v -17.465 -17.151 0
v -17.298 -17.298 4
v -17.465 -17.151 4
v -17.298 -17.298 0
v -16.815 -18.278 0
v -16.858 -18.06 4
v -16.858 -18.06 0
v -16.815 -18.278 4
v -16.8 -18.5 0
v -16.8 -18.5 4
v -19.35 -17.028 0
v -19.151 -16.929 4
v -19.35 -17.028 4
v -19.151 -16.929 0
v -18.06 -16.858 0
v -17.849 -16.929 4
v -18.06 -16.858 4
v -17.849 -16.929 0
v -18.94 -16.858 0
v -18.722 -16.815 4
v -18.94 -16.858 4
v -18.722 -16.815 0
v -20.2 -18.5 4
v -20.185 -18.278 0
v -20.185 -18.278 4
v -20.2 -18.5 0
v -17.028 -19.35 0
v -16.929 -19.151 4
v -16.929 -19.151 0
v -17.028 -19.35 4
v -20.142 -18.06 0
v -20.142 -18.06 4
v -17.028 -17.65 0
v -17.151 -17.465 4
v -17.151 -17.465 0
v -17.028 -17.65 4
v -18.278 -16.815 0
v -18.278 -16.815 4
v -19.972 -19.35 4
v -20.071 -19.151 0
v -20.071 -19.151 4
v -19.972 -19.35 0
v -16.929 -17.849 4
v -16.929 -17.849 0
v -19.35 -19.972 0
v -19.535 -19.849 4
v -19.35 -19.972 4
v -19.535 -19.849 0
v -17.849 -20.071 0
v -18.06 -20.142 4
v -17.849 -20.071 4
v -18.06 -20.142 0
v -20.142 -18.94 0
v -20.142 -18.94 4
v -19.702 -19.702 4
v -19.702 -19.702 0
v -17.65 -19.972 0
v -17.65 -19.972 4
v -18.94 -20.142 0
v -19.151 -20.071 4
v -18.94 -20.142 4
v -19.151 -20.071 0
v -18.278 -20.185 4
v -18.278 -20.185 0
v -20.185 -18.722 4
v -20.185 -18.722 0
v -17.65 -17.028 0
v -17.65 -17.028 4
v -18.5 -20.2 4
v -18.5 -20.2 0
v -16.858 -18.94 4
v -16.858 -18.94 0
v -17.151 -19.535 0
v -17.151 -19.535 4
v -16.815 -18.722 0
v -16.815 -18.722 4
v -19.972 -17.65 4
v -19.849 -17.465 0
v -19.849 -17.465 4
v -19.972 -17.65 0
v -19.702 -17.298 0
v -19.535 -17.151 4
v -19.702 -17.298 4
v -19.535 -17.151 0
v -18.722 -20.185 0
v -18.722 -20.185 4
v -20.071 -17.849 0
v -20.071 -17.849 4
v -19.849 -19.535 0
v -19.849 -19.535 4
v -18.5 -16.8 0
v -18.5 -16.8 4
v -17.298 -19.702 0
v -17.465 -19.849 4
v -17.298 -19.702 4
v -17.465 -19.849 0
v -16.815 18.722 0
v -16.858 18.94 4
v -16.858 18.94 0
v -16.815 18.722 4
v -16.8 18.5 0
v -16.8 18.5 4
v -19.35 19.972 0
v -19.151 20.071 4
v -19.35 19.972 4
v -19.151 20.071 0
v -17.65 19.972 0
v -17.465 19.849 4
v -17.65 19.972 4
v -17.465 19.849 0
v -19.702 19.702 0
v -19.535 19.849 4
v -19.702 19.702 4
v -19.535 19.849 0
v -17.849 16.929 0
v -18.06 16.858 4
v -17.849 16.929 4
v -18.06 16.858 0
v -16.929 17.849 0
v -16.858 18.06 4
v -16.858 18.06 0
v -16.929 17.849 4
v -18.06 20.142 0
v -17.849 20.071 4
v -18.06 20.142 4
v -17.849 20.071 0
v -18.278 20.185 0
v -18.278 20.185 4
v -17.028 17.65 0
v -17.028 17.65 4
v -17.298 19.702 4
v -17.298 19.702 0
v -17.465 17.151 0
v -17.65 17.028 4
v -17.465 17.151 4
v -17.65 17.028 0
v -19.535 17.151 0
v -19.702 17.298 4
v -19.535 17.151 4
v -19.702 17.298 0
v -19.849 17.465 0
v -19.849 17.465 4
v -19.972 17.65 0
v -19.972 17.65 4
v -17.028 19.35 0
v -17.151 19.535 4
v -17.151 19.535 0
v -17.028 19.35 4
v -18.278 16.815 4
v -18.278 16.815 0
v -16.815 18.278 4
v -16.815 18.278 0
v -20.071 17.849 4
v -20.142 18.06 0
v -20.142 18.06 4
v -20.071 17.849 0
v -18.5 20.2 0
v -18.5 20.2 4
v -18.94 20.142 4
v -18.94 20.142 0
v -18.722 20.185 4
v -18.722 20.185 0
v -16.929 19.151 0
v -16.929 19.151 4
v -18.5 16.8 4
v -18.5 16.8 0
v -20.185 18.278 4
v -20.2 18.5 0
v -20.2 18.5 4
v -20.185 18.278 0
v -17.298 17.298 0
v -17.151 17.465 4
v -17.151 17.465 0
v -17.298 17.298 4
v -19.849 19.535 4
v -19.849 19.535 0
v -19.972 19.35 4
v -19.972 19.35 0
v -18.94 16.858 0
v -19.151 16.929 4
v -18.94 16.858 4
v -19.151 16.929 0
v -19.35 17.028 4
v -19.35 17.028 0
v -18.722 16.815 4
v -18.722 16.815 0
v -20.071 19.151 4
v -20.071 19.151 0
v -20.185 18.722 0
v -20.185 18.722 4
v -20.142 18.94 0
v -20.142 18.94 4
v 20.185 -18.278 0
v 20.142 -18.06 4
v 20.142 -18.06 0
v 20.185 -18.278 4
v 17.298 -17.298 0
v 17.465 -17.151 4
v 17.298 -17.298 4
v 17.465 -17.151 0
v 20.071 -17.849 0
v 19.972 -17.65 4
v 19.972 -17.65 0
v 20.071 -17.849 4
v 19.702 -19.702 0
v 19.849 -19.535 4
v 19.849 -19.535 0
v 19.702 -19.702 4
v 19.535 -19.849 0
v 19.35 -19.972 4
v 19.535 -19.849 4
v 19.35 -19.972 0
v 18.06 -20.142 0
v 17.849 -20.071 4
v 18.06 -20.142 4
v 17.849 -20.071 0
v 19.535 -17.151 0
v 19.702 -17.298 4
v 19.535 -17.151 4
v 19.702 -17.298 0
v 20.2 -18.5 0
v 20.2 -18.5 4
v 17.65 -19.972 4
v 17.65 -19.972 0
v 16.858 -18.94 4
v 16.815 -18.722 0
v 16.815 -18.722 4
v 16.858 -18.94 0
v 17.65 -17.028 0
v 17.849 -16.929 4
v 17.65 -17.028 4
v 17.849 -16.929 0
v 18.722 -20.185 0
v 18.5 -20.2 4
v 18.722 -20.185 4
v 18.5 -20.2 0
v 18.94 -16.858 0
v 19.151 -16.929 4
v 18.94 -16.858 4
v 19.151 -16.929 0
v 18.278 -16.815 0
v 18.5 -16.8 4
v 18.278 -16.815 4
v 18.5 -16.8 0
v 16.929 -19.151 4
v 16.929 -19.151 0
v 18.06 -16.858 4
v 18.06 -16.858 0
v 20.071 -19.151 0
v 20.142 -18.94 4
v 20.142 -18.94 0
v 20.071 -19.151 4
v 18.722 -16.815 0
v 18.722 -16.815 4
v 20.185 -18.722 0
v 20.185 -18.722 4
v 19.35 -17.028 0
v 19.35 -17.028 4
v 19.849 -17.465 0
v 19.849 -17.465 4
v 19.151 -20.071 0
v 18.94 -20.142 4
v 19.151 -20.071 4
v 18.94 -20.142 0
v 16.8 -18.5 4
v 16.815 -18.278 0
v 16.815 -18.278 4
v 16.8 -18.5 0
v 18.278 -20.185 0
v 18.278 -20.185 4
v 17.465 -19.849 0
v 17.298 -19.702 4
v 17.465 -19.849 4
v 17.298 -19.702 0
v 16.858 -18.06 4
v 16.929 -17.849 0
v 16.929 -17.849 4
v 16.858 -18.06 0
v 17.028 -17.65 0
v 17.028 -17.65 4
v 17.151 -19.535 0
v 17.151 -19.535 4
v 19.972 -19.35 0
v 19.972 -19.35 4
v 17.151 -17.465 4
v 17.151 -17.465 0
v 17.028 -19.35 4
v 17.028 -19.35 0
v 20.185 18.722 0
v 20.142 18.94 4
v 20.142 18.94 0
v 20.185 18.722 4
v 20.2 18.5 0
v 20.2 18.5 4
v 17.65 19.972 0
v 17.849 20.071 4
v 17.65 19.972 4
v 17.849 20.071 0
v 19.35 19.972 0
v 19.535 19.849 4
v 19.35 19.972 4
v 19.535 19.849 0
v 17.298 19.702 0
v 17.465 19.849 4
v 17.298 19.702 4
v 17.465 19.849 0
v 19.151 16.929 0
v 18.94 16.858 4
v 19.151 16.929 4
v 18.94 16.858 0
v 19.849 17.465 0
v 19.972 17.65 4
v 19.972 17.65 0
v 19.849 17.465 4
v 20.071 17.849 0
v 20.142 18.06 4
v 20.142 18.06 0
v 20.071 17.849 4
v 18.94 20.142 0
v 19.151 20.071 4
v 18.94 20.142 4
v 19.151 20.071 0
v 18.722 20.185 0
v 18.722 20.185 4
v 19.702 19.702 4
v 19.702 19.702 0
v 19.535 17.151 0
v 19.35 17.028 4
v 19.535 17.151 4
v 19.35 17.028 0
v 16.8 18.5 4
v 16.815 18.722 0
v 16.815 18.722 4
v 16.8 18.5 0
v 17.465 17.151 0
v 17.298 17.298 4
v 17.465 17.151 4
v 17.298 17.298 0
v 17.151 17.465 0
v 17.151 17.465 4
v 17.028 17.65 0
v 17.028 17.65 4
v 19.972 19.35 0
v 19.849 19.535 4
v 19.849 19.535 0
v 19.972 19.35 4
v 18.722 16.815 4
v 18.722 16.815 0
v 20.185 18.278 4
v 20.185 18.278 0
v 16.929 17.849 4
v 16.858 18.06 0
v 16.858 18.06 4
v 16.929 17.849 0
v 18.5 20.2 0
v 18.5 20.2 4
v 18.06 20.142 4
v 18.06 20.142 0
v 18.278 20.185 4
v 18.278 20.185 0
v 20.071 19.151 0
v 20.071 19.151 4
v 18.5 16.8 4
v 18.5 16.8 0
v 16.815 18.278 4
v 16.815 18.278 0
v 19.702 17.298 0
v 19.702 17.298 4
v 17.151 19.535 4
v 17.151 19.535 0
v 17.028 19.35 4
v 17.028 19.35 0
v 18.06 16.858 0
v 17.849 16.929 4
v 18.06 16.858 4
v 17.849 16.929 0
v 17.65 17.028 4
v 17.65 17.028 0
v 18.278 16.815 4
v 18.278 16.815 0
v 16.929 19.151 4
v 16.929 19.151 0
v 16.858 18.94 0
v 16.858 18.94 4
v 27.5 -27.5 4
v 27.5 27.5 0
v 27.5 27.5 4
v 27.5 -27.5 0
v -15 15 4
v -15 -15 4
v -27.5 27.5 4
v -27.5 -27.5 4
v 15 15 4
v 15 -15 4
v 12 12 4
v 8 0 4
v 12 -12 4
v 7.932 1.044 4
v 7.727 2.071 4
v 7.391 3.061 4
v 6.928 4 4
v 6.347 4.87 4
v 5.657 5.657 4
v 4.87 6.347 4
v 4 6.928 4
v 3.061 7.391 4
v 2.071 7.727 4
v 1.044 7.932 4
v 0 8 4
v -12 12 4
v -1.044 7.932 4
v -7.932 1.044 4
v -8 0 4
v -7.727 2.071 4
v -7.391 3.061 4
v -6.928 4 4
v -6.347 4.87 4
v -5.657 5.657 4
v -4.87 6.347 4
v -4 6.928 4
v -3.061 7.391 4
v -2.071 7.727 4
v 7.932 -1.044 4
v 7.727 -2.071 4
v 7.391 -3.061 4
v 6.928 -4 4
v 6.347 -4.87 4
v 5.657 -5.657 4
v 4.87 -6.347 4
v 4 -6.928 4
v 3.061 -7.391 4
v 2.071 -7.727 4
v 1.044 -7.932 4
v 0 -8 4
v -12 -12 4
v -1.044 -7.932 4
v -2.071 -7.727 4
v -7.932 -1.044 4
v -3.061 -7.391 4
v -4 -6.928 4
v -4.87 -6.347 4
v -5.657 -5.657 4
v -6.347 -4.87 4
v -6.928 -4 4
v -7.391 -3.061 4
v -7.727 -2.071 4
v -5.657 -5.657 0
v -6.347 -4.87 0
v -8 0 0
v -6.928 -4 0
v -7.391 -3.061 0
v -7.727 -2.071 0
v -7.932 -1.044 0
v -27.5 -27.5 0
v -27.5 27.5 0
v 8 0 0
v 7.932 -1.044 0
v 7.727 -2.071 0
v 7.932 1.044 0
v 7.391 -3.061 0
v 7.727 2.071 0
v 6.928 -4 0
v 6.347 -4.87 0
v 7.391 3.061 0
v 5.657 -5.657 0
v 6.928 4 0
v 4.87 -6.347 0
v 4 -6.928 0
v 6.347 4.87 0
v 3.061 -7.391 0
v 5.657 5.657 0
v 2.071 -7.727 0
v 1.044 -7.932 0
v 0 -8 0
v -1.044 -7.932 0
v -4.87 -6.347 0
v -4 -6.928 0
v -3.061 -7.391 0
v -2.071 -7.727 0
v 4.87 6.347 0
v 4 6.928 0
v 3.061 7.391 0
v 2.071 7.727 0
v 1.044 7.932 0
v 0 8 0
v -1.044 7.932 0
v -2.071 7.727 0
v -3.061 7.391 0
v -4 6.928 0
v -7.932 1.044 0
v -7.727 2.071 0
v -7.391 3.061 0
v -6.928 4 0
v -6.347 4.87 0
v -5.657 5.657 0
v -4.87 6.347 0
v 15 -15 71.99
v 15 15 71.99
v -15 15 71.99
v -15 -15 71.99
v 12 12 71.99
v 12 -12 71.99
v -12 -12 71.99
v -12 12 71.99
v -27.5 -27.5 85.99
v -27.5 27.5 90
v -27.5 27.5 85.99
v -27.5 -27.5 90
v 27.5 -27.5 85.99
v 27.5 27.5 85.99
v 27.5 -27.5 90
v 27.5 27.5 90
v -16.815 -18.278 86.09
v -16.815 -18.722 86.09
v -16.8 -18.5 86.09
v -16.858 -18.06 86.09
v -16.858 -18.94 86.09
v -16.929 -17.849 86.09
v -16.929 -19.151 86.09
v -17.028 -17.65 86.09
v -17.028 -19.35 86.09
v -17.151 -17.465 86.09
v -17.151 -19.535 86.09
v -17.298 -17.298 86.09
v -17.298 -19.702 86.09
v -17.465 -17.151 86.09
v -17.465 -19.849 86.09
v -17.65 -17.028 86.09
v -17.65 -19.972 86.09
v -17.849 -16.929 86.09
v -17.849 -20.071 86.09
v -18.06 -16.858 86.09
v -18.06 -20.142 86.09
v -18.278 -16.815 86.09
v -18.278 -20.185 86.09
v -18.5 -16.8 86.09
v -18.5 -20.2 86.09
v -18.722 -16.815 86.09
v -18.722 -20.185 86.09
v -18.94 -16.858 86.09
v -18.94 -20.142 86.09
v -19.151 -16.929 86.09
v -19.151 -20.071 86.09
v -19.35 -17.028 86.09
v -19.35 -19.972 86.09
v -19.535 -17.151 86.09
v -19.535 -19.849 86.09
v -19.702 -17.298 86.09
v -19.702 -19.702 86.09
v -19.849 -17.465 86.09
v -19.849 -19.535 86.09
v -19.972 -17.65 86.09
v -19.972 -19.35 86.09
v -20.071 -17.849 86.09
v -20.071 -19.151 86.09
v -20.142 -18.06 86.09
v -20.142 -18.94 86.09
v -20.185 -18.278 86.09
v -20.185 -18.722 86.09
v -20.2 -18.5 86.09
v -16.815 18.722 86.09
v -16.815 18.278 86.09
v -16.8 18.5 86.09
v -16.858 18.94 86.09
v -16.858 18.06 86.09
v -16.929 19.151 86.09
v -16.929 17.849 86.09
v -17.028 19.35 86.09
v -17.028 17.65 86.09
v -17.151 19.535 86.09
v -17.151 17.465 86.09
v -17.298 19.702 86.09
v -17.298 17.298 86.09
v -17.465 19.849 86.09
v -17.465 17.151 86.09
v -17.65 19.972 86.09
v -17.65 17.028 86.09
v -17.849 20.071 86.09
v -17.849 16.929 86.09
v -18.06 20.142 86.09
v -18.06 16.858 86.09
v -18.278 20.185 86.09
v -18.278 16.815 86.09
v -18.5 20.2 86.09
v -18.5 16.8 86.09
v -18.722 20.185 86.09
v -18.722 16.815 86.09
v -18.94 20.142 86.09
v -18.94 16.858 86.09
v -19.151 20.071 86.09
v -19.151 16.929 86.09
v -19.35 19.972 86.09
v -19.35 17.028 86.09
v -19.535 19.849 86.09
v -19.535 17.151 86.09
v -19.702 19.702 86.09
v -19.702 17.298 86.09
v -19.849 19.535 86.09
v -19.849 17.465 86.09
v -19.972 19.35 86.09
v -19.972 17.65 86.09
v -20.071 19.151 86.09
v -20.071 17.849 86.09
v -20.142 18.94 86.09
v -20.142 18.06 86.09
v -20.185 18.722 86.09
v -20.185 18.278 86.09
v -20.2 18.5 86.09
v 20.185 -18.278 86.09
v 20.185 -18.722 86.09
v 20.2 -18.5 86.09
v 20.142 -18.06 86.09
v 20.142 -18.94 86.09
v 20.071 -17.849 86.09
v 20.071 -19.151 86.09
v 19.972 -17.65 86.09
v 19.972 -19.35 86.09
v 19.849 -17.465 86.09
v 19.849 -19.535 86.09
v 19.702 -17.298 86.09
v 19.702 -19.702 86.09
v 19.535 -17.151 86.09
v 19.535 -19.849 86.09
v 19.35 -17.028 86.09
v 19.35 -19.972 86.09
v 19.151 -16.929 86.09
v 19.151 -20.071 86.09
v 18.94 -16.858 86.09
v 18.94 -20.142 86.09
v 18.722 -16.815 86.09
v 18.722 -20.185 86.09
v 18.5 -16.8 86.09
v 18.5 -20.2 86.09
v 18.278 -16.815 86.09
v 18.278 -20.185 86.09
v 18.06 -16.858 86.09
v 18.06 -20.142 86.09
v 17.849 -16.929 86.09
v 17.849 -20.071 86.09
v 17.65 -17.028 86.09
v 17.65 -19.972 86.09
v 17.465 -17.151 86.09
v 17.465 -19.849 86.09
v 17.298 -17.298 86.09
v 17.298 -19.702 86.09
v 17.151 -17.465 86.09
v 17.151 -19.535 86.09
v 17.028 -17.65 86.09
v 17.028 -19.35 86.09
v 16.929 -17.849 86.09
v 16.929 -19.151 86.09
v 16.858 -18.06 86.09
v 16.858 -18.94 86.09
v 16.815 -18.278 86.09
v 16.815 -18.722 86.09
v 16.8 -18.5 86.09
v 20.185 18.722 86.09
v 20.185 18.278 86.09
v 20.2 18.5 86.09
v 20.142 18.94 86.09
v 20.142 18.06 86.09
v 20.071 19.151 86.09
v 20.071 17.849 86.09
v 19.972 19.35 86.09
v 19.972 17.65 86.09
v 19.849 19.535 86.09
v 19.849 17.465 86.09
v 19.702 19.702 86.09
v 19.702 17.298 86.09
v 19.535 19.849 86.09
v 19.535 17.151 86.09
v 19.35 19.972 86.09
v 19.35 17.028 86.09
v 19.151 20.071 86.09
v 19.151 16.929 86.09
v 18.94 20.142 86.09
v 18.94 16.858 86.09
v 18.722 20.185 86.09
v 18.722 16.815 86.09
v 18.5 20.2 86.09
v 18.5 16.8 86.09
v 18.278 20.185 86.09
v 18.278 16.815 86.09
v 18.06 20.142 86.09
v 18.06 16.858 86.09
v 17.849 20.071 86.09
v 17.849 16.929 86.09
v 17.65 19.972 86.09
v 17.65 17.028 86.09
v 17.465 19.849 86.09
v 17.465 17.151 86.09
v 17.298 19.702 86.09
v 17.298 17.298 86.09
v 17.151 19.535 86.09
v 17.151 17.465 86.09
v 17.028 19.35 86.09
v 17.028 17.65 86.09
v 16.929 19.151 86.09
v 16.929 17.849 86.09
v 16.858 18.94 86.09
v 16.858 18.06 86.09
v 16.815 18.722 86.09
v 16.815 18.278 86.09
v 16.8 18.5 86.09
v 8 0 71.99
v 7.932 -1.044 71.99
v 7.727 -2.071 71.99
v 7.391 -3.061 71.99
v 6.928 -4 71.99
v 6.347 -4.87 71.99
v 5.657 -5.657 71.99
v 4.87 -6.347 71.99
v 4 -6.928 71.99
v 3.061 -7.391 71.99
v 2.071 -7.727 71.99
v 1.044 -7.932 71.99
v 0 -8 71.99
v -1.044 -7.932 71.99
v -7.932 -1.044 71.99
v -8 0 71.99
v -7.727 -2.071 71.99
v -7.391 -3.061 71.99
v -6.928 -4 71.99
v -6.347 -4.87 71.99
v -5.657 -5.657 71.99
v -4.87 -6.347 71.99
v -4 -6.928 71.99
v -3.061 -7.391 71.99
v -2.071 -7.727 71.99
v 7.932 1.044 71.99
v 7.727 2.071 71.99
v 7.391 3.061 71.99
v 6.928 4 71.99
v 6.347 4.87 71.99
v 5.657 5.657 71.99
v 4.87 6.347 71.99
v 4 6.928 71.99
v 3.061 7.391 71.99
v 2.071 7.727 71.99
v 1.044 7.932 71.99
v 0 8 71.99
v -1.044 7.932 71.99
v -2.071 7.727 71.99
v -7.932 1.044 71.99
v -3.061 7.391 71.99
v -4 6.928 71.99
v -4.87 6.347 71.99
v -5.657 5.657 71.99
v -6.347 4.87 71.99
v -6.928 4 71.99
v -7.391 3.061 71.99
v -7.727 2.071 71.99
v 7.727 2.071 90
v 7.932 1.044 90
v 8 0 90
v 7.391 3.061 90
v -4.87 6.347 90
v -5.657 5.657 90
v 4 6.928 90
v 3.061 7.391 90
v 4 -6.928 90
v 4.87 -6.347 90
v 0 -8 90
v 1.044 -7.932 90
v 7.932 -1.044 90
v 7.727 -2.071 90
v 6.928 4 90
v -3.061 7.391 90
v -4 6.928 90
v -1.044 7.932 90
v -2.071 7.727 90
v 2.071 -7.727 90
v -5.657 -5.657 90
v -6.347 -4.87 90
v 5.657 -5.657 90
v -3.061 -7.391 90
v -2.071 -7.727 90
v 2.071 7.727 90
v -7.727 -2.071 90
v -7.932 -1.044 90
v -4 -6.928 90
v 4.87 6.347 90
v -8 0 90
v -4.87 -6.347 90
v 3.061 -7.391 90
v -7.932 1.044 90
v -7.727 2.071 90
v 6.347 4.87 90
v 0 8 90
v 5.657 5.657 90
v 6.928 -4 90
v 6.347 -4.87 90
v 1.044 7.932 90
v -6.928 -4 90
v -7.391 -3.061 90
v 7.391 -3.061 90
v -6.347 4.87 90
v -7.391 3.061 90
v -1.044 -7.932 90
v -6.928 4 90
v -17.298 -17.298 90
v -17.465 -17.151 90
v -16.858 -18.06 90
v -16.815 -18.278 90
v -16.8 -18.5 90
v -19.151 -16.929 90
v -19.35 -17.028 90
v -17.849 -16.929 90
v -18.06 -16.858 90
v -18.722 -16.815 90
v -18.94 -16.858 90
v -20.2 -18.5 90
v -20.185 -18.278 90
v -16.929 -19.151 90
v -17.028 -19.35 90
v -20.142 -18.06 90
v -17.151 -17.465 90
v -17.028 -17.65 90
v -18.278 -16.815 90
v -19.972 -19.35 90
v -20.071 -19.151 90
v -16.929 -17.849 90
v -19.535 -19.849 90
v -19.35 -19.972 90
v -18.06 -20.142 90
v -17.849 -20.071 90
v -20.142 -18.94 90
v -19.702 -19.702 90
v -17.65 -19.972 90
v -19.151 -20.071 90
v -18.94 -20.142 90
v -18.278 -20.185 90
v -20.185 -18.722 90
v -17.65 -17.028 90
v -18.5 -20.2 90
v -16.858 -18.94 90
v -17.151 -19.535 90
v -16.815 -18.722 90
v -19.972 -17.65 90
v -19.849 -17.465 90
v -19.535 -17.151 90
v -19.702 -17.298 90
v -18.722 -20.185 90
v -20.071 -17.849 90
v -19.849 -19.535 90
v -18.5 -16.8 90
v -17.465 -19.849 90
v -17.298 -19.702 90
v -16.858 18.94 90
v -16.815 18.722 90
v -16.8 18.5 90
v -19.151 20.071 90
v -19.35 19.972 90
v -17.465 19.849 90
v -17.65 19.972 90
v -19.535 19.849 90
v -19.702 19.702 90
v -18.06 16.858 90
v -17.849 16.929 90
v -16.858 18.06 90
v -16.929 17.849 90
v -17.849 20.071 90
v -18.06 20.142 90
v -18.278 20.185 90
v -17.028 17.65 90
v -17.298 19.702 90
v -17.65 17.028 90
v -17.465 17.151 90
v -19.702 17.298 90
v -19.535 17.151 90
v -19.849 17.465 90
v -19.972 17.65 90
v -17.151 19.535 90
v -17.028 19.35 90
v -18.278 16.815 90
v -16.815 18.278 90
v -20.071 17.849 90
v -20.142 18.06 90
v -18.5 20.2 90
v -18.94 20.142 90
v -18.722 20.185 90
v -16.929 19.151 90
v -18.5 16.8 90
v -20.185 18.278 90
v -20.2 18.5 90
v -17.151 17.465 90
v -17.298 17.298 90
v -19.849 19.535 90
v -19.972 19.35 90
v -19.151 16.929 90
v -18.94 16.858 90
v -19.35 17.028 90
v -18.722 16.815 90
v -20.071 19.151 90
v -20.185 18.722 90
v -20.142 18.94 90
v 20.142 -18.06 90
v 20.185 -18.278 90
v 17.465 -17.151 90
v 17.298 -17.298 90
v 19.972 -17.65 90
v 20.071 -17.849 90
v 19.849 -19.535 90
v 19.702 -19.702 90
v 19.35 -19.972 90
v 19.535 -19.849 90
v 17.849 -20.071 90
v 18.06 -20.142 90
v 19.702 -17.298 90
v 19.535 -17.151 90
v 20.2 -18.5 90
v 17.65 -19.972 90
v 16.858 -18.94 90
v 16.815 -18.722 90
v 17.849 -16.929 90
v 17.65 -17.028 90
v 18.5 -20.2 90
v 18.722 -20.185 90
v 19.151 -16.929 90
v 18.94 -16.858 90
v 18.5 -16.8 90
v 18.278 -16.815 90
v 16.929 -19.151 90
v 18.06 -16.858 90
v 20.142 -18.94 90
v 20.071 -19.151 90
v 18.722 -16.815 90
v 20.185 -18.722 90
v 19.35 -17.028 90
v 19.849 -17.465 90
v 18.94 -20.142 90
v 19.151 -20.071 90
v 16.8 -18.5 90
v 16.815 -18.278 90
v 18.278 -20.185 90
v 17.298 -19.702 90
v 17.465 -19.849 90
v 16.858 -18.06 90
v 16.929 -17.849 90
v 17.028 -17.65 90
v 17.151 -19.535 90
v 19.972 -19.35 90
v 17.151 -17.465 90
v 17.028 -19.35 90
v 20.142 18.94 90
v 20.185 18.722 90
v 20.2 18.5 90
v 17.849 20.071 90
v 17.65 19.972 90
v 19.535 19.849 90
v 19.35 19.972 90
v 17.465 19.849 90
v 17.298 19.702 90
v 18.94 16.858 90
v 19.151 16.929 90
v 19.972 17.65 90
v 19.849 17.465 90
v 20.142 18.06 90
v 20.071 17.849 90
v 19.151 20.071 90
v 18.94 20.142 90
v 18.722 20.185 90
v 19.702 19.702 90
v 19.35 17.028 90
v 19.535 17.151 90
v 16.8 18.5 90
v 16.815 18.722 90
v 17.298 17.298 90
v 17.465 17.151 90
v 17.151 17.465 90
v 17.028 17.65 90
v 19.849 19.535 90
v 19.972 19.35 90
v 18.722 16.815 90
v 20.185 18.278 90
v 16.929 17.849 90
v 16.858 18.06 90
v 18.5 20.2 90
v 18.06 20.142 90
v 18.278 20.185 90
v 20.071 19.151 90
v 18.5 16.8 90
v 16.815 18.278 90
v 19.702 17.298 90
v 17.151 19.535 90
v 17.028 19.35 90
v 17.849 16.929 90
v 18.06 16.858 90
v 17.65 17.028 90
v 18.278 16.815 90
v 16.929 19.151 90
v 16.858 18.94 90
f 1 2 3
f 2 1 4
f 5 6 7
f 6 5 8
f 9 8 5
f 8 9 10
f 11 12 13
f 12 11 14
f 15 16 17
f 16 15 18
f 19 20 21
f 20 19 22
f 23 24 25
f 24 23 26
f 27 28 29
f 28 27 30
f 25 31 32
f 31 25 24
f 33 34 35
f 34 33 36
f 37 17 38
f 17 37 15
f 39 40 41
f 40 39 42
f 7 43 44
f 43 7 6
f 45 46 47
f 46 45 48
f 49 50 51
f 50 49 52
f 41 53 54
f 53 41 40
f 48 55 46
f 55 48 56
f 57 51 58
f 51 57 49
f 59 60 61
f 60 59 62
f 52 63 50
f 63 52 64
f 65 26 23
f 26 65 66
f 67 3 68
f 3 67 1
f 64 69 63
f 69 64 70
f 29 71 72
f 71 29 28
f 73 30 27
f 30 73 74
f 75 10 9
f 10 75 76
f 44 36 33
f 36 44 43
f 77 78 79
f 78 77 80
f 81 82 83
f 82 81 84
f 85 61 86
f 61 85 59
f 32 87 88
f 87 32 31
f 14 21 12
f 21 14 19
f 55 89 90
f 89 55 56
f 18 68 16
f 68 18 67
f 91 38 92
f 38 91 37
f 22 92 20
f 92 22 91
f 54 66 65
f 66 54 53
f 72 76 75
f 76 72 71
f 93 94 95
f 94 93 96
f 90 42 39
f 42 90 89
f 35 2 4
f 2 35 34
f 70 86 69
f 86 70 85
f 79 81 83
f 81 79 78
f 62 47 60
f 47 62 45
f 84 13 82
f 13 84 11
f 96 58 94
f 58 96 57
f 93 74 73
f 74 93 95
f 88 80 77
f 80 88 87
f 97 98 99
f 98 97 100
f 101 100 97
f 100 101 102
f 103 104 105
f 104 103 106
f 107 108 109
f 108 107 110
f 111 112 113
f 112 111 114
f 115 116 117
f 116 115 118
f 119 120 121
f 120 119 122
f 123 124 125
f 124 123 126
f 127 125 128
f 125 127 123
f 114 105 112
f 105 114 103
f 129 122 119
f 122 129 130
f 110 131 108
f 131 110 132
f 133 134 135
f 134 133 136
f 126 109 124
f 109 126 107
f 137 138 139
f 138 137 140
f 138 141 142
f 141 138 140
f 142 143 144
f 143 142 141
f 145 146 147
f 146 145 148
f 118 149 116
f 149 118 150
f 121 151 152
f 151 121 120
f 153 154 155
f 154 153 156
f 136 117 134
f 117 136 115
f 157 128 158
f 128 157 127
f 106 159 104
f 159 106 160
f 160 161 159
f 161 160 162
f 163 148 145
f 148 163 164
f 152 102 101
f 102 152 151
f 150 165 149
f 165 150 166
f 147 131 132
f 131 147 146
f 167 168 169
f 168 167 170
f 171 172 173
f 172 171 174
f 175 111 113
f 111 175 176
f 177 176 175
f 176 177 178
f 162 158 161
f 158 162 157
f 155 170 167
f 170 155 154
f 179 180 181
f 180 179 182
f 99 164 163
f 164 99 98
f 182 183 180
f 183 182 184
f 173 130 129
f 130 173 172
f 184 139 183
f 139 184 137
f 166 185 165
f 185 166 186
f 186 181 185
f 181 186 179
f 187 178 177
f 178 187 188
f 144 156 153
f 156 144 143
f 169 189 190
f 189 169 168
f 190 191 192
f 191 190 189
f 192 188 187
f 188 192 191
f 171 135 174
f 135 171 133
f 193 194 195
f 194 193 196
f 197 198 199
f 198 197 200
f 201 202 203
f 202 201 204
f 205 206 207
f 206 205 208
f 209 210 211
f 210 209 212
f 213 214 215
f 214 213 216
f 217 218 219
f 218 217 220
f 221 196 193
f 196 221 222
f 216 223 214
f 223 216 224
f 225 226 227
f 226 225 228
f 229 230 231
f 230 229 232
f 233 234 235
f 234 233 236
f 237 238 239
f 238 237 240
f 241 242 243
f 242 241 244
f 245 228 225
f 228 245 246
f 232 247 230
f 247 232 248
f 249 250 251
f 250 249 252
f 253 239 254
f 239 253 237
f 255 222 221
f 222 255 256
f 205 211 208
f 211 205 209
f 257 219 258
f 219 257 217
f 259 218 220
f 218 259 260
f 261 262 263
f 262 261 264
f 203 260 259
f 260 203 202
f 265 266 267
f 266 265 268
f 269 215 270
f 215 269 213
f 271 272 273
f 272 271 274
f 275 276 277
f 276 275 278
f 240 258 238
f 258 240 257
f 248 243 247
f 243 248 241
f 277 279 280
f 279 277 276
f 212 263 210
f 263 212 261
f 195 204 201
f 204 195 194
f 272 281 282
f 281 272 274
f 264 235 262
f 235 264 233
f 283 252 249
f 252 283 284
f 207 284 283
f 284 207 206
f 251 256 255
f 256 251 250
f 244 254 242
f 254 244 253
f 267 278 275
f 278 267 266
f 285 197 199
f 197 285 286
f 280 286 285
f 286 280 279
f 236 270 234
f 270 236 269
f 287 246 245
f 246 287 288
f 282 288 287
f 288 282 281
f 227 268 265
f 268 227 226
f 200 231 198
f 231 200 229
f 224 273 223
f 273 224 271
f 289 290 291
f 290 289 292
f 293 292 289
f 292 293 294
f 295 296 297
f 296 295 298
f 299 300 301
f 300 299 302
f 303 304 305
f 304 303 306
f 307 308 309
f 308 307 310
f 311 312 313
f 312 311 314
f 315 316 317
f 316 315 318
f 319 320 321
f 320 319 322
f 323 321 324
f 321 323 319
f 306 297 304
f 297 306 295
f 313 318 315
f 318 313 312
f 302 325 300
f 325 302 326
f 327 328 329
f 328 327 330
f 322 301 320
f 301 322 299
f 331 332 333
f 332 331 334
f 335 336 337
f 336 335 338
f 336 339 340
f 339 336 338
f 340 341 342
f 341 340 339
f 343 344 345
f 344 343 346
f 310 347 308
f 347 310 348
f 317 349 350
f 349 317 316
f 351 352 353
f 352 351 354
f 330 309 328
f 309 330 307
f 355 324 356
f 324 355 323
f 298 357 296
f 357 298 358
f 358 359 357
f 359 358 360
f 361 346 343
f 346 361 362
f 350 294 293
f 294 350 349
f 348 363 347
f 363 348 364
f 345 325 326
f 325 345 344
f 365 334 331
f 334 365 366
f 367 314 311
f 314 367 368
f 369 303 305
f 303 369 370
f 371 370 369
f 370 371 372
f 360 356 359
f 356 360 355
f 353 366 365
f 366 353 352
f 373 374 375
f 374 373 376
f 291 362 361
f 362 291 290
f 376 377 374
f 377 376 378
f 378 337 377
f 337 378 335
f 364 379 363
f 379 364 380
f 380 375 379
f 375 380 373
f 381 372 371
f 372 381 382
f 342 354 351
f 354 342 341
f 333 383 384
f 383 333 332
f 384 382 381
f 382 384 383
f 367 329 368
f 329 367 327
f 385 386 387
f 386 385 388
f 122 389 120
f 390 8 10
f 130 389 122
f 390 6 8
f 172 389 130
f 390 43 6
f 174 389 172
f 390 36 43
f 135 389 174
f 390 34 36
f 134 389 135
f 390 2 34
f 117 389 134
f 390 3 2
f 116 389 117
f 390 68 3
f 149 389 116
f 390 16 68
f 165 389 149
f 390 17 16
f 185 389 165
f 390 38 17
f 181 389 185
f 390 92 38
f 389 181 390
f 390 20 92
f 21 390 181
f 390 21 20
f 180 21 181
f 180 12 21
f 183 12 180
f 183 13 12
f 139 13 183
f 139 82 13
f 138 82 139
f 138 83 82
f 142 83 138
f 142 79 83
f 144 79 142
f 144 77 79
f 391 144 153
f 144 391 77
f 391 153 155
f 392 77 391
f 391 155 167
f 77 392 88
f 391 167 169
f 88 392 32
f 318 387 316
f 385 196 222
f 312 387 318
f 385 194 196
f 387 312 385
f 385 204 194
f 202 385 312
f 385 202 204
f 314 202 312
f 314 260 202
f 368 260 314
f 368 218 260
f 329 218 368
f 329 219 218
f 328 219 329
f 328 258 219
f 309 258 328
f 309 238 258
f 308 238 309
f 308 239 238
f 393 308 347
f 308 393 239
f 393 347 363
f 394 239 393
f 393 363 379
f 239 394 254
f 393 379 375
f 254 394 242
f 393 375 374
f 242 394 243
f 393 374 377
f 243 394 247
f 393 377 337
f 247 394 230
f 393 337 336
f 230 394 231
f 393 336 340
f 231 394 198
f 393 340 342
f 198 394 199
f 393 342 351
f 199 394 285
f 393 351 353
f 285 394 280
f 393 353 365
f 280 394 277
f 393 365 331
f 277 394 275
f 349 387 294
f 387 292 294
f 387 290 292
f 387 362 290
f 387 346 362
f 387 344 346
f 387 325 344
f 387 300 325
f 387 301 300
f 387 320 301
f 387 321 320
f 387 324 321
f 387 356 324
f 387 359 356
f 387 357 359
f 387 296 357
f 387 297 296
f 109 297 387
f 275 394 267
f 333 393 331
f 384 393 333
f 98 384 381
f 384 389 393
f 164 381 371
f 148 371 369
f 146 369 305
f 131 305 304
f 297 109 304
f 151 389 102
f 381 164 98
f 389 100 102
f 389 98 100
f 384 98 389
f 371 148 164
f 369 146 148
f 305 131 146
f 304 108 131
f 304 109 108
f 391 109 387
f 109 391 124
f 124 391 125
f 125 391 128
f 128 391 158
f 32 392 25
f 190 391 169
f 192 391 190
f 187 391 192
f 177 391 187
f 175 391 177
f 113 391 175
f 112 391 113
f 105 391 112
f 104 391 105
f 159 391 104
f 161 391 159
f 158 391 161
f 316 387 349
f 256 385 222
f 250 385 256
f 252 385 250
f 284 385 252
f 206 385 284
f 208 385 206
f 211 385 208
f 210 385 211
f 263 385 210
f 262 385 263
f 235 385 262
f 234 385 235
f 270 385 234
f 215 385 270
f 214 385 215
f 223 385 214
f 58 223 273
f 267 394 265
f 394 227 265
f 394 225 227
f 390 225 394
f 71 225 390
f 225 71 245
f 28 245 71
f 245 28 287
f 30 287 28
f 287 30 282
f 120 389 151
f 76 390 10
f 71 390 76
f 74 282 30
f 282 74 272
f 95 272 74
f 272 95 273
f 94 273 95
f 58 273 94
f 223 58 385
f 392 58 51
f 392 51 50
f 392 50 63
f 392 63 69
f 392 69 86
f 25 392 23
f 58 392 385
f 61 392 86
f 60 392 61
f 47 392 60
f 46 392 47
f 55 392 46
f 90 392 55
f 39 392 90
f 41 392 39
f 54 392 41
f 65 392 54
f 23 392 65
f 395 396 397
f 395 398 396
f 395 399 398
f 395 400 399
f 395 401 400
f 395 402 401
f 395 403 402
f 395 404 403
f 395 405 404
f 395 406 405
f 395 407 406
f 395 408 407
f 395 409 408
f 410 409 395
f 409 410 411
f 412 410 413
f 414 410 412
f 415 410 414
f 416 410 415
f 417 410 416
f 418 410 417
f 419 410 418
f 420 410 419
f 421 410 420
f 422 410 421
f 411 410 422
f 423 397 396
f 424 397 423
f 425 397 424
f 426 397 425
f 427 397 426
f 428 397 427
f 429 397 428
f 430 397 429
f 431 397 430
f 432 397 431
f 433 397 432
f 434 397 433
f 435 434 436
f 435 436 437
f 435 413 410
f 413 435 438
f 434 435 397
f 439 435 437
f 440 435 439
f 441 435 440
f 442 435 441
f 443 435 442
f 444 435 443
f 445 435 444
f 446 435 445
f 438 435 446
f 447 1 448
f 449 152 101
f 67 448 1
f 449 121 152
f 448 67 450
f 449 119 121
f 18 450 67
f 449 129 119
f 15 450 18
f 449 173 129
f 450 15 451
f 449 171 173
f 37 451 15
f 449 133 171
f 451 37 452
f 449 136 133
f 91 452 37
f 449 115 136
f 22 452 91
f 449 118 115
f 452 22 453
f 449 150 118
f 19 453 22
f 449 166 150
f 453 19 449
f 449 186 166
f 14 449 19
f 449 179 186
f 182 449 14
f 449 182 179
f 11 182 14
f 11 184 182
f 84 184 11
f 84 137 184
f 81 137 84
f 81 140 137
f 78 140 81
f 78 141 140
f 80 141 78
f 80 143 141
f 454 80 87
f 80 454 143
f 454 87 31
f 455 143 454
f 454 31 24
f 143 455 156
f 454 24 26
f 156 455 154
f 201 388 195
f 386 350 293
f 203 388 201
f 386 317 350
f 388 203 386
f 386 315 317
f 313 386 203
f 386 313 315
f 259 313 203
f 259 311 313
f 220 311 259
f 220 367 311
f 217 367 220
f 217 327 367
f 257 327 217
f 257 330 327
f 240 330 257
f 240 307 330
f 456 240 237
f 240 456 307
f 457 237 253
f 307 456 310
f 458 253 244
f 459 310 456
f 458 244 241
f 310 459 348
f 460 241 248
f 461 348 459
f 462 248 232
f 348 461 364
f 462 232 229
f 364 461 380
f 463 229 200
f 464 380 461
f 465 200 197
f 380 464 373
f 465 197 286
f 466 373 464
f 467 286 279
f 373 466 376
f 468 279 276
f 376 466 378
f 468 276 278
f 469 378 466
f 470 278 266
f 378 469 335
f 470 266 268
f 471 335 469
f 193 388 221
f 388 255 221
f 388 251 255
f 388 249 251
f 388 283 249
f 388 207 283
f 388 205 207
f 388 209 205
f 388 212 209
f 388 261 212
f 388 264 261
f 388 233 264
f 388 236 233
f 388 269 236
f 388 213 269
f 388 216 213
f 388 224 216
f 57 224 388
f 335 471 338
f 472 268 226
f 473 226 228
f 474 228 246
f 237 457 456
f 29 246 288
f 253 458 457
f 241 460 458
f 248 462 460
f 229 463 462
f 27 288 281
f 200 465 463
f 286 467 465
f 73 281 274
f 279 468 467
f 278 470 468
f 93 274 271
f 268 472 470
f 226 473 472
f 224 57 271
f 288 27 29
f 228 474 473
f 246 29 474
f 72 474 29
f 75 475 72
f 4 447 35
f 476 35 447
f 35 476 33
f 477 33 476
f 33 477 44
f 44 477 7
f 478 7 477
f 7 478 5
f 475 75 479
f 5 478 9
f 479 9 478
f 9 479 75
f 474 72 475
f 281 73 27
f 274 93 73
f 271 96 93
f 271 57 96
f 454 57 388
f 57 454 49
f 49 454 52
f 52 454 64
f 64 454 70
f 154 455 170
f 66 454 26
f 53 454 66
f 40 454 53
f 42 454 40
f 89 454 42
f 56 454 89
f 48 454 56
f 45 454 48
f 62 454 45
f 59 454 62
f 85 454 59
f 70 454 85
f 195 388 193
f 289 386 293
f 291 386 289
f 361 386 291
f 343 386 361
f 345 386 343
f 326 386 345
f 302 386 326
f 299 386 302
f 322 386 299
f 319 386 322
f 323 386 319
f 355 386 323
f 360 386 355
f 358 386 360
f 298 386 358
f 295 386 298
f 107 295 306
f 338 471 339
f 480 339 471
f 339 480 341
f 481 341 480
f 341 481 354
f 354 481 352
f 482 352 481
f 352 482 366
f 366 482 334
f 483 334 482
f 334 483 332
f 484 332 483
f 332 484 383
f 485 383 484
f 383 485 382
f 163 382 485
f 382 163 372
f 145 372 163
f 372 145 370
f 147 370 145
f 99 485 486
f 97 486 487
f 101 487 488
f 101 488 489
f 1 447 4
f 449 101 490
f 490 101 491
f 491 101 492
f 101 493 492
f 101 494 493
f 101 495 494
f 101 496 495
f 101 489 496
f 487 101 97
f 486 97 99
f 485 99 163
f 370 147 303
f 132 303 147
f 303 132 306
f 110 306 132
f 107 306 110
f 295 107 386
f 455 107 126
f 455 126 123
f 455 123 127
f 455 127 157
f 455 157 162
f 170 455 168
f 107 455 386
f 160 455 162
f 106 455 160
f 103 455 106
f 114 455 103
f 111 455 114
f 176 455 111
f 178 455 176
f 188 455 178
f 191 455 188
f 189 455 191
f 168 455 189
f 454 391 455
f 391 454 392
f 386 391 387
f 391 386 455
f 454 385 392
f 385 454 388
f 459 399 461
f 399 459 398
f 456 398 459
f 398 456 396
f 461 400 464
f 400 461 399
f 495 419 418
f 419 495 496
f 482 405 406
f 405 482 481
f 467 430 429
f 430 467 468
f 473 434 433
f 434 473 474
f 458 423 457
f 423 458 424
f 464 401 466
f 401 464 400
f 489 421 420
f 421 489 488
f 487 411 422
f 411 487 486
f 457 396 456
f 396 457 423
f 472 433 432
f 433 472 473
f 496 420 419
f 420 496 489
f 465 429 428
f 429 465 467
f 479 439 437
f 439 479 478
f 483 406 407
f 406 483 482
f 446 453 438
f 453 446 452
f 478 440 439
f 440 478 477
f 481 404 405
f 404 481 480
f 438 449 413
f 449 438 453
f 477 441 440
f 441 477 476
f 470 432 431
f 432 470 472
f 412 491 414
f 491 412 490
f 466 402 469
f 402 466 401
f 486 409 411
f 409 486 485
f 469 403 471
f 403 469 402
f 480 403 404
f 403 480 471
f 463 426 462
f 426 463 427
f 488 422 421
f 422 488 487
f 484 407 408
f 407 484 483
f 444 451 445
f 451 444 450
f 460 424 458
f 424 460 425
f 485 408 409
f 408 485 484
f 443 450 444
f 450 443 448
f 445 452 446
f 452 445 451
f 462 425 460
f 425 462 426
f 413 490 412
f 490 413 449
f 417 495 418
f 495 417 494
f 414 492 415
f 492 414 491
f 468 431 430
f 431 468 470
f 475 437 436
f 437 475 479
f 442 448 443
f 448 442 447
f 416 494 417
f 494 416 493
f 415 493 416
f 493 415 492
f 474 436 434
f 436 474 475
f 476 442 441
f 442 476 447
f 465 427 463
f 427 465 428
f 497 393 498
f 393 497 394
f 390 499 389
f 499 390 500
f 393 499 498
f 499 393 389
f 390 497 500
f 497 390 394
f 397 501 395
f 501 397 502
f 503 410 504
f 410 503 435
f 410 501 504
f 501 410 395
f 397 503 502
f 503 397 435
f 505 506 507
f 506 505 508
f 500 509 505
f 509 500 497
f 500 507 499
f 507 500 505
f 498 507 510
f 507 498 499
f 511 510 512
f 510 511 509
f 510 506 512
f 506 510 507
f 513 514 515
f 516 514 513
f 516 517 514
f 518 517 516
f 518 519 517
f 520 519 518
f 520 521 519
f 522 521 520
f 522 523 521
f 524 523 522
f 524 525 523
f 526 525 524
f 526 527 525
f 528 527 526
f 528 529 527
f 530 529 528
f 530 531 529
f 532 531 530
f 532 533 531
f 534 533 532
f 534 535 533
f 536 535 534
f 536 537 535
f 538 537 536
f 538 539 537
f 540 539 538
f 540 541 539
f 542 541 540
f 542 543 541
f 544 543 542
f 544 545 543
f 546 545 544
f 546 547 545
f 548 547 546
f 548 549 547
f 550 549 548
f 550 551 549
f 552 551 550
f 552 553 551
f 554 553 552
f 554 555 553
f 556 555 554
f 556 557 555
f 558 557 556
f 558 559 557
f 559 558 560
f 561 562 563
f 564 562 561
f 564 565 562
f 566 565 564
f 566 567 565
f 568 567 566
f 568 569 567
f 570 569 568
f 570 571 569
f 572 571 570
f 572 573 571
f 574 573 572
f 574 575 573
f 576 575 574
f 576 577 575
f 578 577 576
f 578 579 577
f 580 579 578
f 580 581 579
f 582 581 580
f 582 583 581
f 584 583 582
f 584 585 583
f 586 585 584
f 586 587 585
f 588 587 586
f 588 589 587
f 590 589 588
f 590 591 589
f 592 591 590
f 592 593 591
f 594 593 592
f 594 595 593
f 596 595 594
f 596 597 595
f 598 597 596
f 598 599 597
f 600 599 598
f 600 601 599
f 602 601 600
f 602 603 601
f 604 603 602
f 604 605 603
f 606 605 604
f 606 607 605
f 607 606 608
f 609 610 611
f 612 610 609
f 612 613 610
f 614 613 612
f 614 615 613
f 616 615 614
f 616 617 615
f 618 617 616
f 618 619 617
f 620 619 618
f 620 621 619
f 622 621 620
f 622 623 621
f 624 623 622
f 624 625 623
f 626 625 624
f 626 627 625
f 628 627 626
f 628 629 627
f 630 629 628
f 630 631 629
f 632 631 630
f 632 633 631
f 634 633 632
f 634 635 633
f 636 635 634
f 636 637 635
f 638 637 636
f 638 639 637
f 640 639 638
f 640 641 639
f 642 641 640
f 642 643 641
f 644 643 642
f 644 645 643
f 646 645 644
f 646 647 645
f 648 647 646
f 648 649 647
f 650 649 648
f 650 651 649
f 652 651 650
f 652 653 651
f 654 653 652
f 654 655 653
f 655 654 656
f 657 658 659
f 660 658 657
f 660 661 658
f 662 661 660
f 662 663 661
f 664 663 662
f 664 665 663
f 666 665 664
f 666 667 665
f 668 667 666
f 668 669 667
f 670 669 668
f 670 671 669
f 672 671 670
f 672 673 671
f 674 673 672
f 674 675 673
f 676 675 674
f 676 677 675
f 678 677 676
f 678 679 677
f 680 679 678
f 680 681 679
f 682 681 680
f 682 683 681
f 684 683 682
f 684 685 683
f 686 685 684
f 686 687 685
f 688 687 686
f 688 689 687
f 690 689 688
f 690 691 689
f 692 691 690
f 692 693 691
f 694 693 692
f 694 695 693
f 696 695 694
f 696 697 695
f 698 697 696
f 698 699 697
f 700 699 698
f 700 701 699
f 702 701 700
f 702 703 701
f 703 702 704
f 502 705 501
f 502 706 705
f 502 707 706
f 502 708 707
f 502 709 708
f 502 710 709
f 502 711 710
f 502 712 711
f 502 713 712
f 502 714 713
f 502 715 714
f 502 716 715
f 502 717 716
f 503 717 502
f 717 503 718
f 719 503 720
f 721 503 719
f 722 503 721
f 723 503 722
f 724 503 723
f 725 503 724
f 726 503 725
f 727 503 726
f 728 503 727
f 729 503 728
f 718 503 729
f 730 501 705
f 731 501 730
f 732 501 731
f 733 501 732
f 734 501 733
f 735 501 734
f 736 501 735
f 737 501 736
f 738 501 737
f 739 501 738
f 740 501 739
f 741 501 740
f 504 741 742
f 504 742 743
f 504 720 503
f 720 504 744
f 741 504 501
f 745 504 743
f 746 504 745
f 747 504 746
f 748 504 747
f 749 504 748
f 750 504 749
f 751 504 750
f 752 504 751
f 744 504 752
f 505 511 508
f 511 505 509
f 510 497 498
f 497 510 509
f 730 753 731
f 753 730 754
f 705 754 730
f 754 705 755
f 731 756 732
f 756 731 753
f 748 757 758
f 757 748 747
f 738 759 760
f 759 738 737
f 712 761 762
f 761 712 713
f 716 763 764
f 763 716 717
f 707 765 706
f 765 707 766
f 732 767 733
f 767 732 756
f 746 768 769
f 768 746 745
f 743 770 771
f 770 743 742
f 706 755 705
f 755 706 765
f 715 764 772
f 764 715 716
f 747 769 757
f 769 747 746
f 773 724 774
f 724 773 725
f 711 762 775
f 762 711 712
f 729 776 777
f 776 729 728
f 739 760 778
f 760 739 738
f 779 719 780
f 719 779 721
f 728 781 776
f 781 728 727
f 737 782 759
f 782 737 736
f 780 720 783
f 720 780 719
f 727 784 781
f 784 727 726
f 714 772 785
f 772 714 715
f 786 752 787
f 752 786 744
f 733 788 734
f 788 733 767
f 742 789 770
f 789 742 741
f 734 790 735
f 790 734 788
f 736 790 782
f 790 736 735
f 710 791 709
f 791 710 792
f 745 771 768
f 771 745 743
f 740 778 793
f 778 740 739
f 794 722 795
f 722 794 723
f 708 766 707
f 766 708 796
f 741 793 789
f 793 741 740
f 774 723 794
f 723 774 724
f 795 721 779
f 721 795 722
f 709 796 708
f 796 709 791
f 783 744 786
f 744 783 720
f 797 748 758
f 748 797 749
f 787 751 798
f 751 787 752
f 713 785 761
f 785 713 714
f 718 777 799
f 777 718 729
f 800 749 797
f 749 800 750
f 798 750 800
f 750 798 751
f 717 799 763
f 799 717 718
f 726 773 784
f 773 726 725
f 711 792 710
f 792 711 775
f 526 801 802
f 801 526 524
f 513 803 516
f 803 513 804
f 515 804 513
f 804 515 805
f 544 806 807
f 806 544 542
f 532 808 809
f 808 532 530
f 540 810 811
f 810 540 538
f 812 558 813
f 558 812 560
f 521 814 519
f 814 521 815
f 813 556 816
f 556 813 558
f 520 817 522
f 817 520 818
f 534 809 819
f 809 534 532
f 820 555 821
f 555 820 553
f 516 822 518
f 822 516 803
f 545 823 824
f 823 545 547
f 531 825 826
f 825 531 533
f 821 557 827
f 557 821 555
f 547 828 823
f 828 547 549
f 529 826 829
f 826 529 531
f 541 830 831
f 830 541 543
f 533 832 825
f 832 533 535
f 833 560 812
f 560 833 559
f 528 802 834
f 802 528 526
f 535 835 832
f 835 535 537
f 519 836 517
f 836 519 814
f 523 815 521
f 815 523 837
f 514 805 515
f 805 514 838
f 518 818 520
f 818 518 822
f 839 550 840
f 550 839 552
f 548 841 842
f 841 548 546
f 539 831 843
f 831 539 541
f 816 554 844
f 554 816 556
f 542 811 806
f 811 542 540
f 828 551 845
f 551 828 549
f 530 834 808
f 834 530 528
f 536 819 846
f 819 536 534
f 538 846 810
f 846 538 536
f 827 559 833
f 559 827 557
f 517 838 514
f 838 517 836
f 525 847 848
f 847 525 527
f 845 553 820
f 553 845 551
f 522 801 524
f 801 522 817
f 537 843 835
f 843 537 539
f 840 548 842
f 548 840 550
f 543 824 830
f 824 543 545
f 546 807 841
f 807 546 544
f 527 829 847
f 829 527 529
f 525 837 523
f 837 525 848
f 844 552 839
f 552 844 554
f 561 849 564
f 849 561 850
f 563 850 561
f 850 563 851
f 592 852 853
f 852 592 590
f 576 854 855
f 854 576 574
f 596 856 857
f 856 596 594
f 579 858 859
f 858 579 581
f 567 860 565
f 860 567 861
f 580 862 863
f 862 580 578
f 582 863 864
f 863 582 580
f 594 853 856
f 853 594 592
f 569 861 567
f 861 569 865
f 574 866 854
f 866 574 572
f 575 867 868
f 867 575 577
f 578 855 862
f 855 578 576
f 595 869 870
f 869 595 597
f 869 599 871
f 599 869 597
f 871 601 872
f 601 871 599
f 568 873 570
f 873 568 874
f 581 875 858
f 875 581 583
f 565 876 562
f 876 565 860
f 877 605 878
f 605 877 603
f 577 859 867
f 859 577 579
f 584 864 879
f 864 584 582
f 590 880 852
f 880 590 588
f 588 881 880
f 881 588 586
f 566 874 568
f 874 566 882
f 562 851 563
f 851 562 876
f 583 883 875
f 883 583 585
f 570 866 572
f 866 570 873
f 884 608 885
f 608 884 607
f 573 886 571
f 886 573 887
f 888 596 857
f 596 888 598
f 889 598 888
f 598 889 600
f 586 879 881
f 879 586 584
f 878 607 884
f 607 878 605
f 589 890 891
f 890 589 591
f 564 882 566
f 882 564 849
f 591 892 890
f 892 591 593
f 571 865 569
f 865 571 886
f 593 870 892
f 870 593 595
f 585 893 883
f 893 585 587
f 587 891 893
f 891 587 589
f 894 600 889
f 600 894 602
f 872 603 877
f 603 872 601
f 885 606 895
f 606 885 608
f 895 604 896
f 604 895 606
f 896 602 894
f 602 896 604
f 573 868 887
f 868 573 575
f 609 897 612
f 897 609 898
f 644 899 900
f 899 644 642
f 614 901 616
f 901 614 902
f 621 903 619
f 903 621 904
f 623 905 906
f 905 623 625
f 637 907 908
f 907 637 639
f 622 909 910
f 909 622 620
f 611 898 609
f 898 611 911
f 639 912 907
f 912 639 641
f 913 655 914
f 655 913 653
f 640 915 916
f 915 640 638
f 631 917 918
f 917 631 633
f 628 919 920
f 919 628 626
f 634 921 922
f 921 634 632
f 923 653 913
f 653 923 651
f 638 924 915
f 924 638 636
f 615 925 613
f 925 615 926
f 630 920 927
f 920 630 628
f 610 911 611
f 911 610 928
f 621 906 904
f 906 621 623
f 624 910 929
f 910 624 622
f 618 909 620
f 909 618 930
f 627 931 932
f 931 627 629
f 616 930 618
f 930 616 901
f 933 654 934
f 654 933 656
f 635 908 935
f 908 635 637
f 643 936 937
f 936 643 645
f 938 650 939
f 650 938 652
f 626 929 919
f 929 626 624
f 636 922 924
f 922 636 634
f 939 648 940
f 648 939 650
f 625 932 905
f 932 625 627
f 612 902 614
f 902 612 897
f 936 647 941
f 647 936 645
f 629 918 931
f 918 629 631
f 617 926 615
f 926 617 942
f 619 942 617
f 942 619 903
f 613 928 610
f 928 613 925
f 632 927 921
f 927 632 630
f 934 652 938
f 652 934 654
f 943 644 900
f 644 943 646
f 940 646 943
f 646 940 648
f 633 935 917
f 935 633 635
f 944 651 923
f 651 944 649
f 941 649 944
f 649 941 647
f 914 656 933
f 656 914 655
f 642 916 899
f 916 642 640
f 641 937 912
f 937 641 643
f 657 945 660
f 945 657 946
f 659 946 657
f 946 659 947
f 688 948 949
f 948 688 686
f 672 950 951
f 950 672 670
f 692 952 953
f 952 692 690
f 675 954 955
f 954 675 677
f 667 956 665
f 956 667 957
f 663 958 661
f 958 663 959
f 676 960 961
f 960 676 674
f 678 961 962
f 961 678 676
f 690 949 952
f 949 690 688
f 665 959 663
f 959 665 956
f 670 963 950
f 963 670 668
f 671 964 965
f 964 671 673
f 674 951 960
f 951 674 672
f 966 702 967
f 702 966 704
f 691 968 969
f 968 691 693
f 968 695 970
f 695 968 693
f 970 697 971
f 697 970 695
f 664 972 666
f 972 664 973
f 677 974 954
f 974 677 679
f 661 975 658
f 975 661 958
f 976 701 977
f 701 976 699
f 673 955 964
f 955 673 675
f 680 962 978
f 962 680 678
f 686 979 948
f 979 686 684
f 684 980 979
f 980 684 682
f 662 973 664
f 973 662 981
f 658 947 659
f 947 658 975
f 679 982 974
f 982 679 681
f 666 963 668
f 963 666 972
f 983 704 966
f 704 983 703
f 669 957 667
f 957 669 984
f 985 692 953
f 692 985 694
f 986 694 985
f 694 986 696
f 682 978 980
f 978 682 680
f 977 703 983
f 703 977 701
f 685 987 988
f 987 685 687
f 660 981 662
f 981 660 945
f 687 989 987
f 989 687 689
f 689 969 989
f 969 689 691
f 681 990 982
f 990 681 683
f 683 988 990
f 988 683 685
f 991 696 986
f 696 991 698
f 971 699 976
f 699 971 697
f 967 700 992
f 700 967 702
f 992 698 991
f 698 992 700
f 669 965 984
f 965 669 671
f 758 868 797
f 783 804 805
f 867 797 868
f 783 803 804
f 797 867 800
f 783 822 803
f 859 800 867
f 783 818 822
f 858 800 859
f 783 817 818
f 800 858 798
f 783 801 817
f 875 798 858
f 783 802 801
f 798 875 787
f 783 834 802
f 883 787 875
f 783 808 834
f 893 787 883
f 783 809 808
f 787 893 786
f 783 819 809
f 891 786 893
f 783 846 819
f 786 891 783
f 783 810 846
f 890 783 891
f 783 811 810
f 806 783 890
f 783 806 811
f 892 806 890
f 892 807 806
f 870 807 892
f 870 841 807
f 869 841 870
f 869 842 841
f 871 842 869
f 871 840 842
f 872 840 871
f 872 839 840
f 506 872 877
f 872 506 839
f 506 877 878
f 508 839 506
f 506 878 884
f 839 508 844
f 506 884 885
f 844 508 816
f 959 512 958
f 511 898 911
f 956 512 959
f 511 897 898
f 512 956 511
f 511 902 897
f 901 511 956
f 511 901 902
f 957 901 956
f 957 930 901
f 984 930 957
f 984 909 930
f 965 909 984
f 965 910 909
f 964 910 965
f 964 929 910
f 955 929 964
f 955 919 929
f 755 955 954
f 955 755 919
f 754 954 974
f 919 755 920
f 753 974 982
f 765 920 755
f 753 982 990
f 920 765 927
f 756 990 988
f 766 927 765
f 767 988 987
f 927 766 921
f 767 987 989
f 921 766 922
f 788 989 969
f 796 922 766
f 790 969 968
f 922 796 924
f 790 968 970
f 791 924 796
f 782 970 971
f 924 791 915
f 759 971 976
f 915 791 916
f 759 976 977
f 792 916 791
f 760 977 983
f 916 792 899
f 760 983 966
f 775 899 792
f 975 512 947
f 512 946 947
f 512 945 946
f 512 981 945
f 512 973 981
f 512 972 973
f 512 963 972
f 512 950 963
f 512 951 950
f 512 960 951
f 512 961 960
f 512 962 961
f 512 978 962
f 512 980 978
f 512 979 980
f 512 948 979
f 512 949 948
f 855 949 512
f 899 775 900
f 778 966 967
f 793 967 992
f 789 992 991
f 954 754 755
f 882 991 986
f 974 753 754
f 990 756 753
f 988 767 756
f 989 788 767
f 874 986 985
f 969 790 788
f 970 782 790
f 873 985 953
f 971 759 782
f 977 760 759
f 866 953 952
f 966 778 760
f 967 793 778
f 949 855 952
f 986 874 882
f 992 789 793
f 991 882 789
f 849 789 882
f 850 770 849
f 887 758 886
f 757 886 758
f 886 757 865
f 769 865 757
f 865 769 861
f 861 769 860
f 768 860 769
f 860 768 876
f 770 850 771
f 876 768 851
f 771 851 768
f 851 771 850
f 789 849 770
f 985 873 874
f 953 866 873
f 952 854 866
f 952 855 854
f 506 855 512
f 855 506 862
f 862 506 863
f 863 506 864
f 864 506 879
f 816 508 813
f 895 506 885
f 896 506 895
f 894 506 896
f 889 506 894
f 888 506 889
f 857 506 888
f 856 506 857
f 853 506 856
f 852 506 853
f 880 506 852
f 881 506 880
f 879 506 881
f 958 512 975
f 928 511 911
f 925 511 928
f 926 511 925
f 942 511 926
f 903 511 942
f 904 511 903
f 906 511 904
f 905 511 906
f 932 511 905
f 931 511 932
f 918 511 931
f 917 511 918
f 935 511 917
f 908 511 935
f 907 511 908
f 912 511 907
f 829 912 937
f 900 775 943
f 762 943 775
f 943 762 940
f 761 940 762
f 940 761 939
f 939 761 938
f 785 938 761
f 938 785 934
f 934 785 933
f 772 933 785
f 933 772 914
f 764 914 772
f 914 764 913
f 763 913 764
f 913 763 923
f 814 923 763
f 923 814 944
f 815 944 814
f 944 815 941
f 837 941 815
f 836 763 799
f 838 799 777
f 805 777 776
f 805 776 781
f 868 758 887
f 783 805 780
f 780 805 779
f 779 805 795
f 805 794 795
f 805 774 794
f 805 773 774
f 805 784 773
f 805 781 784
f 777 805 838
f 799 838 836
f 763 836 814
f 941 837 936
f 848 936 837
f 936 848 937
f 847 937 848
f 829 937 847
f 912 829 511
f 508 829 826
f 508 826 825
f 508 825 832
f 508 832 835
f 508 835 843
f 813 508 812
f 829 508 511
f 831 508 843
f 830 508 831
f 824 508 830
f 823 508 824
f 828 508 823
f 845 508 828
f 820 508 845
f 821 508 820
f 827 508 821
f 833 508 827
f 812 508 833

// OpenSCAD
// RenoScout camera riser
// Lifts the camera head off the deck to room-viewing height so it frames walls,
// not the floor. Bottom flange bolts to the chassis M3 grid; the camera mount or
// pan/tilt head bolts to the top flange. Hollow centre = cable pass-through.
//
// SUPPORT-FREE BY DESIGN: the column flares out to the top flange at ~42 deg (under
// the 45 deg overhang limit), so it prints clean on DEFAULT settings with NO supports
// and no stringing. (The first version had a flat top ledge overhanging the column,
// which is what strung. Rule for all future parts: chamfer/flare instead of a flat
// overhang, keep every unsupported face within 45 deg of vertical.)
//
// OpenSCAD -> F6 -> Export STL. Cura: default profile, NO supports, brim optional.
// Prints upright, bottom flange on the bed.

riser_h  = 90;    // total height off the deck (Z; well under the 280 mm limit)
col      = 30;    // column outer size (square)
wall     = 3;     // column wall thickness
flange   = 55;    // flange plate size (square; fits the 225 bed easily)
flange_t = 4;     // flange thickness
taper_h  = 14;    // height of the 45 deg flare (>= (flange-col)/2 keeps it <=45 deg)
bore_d   = 16;    // cable pass-through bore
hole_d   = 3.4;   // M3 clearance
hole_in  = 9;     // how far the corner holes sit in from the flange edge
$fn      = 48;

col_h = riser_h - 2 * flange_t - taper_h;   // straight hollow column section

module flange_plate()
  difference() {
    translate([-flange / 2, -flange / 2, 0]) cube([flange, flange, flange_t]);
    for (x = [-1, 1], y = [-1, 1])
      translate([x * (flange / 2 - hole_in), y * (flange / 2 - hole_in), -1])
        cylinder(d = hole_d, h = flange_t + 2);
    translate([0, 0, -1]) cylinder(d = bore_d, h = flange_t + 2);   // cable bore
  }

// bottom flange (bolts down to the chassis grid)
flange_plate();

// hollow column
translate([0, 0, flange_t - 0.01])
  difference() {
    translate([-col / 2, -col / 2, 0]) cube([col, col, col_h + 0.02]);
    translate([-(col / 2 - wall), -(col / 2 - wall), -1]) cube([col - 2 * wall, col - 2 * wall, col_h + 2]);
  }

// 45 deg flare from column width up to flange width (self-supporting), cable bore
translate([0, 0, flange_t + col_h - 0.01])
  difference() {
    hull() {
      linear_extrude(0.1) square(col, center = true);
      translate([0, 0, taper_h]) linear_extrude(0.1) square(flange, center = true);
    }
    translate([0, 0, -1]) cylinder(d = bore_d, h = taper_h + 2);
  }

// top flange (camera mount / pan-tilt head bolts on)
translate([0, 0, riser_h - flange_t]) flange_plate();
